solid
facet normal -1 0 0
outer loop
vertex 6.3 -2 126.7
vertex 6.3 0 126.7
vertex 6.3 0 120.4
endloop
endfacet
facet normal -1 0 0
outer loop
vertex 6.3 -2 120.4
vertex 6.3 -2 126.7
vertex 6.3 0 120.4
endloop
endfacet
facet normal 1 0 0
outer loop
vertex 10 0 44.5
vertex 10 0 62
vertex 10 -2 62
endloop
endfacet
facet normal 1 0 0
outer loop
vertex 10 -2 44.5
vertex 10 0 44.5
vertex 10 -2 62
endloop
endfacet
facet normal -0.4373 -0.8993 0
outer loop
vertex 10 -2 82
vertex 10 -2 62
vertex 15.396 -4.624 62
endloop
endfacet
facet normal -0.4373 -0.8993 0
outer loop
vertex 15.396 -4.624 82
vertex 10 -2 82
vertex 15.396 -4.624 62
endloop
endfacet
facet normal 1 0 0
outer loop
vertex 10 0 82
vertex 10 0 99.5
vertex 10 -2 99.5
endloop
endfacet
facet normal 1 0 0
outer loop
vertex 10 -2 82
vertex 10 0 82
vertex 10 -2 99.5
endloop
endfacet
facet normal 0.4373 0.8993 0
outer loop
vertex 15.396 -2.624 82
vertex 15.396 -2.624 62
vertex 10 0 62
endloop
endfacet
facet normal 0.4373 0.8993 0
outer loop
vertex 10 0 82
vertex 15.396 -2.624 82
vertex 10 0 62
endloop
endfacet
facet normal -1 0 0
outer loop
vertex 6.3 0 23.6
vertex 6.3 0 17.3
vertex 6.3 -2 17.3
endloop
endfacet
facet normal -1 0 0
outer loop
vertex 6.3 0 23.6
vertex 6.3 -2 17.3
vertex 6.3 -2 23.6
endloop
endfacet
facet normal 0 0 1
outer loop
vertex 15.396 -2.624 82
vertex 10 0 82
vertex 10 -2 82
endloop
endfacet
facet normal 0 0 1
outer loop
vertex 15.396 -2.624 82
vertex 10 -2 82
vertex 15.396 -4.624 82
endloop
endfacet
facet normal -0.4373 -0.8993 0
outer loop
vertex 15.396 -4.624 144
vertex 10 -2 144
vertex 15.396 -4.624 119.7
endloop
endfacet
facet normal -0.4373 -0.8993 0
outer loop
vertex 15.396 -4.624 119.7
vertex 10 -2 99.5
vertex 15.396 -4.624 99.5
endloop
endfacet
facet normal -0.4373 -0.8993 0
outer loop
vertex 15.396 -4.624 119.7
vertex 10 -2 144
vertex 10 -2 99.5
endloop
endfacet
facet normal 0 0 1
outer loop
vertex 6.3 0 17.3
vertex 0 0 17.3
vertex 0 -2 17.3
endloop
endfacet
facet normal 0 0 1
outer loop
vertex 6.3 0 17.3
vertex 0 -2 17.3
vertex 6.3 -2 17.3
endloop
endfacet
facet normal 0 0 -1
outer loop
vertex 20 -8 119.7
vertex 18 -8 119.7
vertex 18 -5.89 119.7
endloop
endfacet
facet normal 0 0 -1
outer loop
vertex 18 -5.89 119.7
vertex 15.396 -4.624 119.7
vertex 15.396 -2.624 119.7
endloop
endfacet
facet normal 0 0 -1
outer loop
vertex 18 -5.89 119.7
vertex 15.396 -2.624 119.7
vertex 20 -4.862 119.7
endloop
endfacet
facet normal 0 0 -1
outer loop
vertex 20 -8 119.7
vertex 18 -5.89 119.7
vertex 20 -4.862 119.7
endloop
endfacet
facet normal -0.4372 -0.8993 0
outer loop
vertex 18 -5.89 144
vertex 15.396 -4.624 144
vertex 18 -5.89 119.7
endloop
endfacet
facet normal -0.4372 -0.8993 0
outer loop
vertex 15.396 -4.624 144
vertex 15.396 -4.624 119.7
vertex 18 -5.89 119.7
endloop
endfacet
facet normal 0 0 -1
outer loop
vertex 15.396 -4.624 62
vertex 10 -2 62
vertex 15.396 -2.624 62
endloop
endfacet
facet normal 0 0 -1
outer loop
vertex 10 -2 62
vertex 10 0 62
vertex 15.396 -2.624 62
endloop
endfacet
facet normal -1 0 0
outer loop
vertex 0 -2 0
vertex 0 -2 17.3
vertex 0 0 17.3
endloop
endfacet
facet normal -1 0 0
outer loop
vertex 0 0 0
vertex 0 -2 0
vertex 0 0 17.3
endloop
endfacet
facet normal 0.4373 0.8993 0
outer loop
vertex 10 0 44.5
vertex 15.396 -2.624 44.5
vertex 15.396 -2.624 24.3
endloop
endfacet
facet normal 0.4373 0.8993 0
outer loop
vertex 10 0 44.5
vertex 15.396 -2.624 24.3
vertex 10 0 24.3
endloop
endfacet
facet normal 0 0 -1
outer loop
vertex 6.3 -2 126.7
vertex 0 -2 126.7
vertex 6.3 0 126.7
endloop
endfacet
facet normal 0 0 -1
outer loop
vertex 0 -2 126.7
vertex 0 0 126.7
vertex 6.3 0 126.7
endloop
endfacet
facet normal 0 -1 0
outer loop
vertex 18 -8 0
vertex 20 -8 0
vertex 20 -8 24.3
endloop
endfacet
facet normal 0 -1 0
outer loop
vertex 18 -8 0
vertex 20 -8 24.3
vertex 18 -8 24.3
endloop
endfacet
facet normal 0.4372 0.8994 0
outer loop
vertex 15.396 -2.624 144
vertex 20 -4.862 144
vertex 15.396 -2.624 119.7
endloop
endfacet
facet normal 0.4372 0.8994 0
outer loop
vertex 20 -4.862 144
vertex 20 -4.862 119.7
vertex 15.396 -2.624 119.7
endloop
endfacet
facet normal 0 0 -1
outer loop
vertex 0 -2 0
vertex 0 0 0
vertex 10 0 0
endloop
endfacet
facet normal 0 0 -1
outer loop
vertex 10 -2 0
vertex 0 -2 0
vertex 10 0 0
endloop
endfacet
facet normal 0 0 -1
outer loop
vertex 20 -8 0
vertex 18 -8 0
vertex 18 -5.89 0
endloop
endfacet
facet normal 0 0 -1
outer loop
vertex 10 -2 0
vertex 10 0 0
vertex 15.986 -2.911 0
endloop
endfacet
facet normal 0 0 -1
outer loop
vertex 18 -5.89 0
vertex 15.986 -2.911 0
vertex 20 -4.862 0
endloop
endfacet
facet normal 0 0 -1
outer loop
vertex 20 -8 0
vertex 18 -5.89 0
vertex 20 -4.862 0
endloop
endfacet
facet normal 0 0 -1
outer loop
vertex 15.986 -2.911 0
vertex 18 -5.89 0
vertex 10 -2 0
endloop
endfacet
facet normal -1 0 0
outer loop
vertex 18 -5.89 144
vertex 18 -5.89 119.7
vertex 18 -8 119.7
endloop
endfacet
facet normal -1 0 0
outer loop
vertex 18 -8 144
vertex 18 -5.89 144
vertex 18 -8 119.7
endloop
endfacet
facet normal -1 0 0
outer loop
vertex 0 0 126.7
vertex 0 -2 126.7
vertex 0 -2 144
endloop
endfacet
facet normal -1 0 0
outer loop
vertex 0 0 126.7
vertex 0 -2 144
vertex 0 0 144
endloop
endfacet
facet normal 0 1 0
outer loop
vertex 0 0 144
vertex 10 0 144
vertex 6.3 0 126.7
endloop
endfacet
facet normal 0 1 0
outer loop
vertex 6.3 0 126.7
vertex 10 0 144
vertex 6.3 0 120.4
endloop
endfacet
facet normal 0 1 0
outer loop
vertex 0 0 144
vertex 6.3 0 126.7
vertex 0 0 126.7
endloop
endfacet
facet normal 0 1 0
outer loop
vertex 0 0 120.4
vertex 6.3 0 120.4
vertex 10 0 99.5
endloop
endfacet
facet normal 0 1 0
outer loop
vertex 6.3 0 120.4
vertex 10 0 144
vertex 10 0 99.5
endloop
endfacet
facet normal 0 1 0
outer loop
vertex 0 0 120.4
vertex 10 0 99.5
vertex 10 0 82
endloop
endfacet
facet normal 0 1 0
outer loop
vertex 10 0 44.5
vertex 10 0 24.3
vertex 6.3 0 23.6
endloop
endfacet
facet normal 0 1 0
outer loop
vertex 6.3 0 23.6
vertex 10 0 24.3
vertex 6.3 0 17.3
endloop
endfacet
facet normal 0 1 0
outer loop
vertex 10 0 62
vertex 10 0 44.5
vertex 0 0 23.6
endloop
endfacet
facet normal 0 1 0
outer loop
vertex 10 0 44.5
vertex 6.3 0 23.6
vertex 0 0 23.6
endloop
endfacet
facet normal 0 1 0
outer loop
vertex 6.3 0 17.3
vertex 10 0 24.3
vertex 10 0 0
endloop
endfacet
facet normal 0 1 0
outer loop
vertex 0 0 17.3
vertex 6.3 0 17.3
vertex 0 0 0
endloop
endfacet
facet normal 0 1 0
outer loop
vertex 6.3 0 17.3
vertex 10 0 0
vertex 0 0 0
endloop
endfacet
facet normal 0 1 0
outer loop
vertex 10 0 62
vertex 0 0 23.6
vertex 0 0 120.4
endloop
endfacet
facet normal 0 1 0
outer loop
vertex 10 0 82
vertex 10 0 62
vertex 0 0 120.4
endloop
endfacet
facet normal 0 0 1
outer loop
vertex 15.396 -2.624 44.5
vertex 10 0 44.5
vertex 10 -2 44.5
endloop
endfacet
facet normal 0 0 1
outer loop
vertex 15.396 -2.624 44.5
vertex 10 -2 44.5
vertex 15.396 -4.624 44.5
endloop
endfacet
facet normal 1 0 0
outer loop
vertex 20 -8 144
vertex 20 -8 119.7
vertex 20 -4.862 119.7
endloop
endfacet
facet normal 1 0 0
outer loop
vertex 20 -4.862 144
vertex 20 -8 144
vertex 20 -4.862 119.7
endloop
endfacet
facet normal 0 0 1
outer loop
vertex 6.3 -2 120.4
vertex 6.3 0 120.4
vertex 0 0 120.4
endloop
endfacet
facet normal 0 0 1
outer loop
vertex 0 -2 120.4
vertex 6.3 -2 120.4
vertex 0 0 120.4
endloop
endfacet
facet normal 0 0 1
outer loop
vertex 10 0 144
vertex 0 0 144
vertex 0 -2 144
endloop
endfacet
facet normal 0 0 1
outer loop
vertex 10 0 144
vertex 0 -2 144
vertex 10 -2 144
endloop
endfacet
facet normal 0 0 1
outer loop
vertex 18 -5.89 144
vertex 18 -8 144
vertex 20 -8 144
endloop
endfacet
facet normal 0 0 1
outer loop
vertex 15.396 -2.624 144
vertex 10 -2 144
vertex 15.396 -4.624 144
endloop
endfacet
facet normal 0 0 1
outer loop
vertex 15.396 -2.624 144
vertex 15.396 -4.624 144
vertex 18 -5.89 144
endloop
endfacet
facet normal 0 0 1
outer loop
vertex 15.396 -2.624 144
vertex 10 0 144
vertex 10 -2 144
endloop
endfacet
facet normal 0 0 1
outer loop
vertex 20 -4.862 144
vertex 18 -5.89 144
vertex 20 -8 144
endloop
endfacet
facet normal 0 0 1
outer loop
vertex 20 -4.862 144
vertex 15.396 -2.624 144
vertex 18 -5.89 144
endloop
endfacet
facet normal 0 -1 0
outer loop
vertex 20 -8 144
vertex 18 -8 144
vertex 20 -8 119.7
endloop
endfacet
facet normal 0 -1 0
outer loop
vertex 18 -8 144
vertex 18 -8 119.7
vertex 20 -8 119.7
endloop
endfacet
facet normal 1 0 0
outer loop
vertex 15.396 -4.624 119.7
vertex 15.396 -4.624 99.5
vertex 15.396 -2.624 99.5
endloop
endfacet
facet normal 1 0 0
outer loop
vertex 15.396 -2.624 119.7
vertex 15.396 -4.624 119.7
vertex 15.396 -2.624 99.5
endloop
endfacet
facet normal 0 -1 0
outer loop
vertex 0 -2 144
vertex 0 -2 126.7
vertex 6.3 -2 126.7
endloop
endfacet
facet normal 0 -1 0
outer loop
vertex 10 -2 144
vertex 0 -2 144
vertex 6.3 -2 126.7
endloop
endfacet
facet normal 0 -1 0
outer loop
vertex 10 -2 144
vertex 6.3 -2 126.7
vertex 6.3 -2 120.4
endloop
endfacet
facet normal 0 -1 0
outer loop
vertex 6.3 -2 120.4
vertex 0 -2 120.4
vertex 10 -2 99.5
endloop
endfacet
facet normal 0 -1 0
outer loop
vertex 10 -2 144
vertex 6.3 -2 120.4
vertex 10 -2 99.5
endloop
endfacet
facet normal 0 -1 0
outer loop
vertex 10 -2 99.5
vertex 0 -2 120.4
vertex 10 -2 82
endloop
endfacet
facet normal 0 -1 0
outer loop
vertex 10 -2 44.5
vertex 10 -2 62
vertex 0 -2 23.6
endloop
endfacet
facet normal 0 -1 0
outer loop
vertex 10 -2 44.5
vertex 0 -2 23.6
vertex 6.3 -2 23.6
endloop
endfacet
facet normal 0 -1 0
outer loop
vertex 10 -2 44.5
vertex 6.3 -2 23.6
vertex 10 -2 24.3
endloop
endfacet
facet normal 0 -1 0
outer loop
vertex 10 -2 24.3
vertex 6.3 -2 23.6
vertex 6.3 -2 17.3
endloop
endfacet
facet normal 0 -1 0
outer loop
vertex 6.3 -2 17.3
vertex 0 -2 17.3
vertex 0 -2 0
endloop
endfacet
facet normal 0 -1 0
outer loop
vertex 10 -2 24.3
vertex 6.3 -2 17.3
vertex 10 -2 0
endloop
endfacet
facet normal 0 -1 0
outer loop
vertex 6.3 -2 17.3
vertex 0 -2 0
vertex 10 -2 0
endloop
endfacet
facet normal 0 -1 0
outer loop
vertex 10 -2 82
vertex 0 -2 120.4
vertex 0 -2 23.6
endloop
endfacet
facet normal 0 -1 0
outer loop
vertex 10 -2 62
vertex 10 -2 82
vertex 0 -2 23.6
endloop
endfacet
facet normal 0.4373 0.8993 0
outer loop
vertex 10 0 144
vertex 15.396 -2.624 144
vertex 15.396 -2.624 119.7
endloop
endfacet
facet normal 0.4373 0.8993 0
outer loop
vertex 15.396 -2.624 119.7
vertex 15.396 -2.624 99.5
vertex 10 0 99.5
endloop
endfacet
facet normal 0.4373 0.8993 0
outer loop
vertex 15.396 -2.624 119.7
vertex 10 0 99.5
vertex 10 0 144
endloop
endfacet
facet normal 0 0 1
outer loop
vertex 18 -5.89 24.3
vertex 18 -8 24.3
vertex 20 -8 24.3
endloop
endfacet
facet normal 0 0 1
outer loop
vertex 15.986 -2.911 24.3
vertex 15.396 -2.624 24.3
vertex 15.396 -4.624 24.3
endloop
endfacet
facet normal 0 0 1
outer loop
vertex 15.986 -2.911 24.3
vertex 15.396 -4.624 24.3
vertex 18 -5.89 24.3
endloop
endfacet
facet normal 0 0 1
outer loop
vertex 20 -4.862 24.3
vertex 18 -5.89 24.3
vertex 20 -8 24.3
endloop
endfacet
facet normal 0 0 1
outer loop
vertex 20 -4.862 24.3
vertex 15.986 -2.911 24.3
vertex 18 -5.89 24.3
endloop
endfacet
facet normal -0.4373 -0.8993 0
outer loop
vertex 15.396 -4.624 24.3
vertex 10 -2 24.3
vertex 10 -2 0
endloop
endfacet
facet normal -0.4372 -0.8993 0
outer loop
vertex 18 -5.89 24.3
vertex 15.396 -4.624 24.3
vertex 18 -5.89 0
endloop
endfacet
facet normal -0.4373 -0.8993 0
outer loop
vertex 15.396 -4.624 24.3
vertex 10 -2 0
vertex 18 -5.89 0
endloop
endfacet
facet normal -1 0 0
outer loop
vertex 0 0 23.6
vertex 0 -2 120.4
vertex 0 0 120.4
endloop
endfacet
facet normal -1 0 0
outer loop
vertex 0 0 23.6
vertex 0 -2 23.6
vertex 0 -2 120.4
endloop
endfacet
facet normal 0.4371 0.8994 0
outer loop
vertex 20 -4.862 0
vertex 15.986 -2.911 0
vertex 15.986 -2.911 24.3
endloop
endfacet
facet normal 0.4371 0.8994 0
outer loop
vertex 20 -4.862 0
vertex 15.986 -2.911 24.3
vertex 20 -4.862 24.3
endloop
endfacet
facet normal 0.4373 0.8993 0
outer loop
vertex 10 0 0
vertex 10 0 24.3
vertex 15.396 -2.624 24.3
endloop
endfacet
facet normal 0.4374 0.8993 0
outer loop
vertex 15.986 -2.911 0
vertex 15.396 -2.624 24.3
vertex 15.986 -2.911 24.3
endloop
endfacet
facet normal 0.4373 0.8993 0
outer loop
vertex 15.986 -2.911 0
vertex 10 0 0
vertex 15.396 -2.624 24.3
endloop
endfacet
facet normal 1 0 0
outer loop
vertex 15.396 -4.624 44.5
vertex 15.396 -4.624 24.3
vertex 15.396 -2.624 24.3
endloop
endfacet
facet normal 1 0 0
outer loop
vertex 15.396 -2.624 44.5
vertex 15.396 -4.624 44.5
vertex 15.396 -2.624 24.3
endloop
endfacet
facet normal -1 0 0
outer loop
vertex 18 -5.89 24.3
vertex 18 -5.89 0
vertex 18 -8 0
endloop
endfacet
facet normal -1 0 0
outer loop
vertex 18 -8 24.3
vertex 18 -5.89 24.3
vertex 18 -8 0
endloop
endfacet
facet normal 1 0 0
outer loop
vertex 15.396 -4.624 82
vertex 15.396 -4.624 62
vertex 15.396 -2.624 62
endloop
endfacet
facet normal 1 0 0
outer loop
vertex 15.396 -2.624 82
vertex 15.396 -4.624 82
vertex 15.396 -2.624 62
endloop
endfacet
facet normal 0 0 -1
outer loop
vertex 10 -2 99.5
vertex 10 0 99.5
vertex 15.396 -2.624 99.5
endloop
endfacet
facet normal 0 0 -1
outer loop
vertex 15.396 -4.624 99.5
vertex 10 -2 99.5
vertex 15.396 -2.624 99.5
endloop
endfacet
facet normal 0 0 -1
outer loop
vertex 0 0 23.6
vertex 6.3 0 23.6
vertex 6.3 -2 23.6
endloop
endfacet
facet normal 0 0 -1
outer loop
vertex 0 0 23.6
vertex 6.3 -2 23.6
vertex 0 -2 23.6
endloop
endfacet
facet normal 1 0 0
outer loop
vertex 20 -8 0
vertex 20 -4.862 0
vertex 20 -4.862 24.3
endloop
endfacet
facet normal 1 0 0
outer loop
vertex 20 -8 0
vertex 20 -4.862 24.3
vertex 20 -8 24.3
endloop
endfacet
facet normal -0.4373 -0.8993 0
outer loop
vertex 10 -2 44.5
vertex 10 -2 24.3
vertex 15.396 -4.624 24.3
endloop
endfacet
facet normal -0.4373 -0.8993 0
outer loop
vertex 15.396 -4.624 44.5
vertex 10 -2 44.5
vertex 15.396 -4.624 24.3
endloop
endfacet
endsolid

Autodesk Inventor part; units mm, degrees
ref_plane "YZ Plane" through (0, 0, 0) normal (1, 0, 0) x (0, 1, 0)
ref_plane "XZ Plane" through (0, 0, 0) normal (0, 1, 0) x (-1, 0, 0)
ref_plane "XY Plane" through (0, 0, 0) normal (0, 0, 1) x (1, 0, 0)
sketch "Szkic32" plane through (0, 0, 0) normal (0, 0, 1) x (1, 0, 0)
  line L0 (0, 0) -> (10, 0)
  line L1 (10, 0) -> (15.9865, -2.9108)
  line L2 (10, 0) -> (16.6566, 0) construction
  line L3 (10, 0) -> (20.0005, -4.8625)
  line L4 (20.0005, -4.8625) -> (20.0005, -7.9995)
  line L5 (20.0005, -7.9995) -> (18.0005, -7.9995)
  line L6 (0, 0) -> (0, -2)
  line L7 (0, -2) -> (10, -2)
  line L8 (10, -2) -> (18.0005, -5.89)
  line L9 (10, -2) -> (18.8961, -2) construction
  line L10 (18.0005, -5.89) -> (18.0005, -7.9995)
  dimension "d102" = 10
  dimension "d103" = 25.93
  dimension "d104" = 11.12
  dimension "d105" = 3.137
  dimension "d106" = 2
  dimension "d107" = 2
  dimension "d108" = 10
  dimension "d109" = 25.93
extrude "Wyciągnięcie proste35" add sketch "Szkic32" along normal blind 24.3
sketch "Szkic33" plane through (0, 0, 24.3) normal (0, 0, 1) x (1, 0, 0)
  line L0 (10, 0) -> (0, 0) projected
  line L1 (0, 0) -> (0, -2) projected
  line L2 (0, -2) -> (10, -2) projected
  line L3 (0, 0) -> (10, 0)
  line L4 (10, 0) -> (10, -2)
  line L5 (10, -2) -> (0, -2)
  line L6 (0, -2) -> (0, 0)
  line L7 (10, -2) -> (15.396, -4.6236)
  line L8 (10, -2) -> (18.0005, -5.89) projected
  line L9 (15.396, -4.6236) -> (15.396, -2.6236)
  line L10 (20.0005, -4.8625) -> (10, 0) projected
  line L11 (10, 0) -> (15.396, -2.6236)
  dimension "d112" = 6
extrude "Wyciągnięcie proste36" add sketch "Szkic33" along normal blind 20.2
sketch "Szkic34" plane through (0, 0, 44.5) normal (0, 0, 1) x (1, 0, 0)
  line L0 (10, 0) -> (0, 0) projected
  line L1 (0, -2) -> (10, -2) projected
  line L2 (0, 0) -> (10, 0)
  line L3 (10, 0) -> (10, -2)
  line L4 (10, -2) -> (0, -2)
  line L5 (0, -2) -> (0, 0)
extrude "Wyciągnięcie proste37" add sketch "Szkic34" along normal blind 17.5
sketch "Szkic36" plane through (0, 0, 62) normal (0, 0, 1) x (1, 0, 0)
  line L0 (15.396, -2.6236) -> (10, 0) projected
  line L1 (15.396, -4.6236) -> (15.396, -2.6236) projected
  line L2 (10, -2) -> (15.396, -4.6236) projected
  line L3 (0, -2) -> (10, -2) projected
  line L4 (10, 0) -> (0, 0) projected
  line L5 (0, 0) -> (0, -2) projected
  line L6 (10, 0) -> (15.396, -2.6236)
  line L7 (15.396, -2.6236) -> (15.396, -4.6236)
extrude "Wyciągnięcie proste38" add sketch "Szkic36" along normal blind 20
sketch "Szkic37" plane through (0, 0, 82) normal (0, 0, 1) x (1, 0, 0)
  line L0 (10, 0) -> (0, 0) projected
  line L1 (0, -2) -> (10, -2) projected
  line L2 (0, 0) -> (10, 0)
  line L3 (10, 0) -> (10, -2)
  line L4 (10, -2) -> (0, -2)
  line L5 (0, -2) -> (0, 0)
extrude "Wyciągnięcie proste39" add sketch "Szkic37" along normal blind 17.5
sketch "Szkic38" plane through (0, 0, 99.5) normal (0, 0, 1) x (1, 0, 0)
  line L0 (15.396, -2.6236) -> (10, 0) projected
  line L1 (15.396, -4.6236) -> (15.396, -2.6236) projected
  line L2 (10, -2) -> (15.396, -4.6236) projected
  line L3 (0, -2) -> (10, -2) projected
  line L4 (10, 0) -> (0, 0) projected
  line L5 (10, 0) -> (0, 0) projected
  line L6 (0, 0) -> (0, -2) projected
  line L7 (0, -2) -> (10, -2) projected
  line L8 (10, -2) -> (10, 0) projected
extrude "Wyciągnięcie proste40" add sketch "Szkic38" along normal blind 20.2
sketch "Szkic39" plane through (0, 0, 119.7) normal (0, 0, 1) x (1, 0, 0)
  line L0 (15.396, -2.6236) -> (15.396, -4.6236) projected
  line L1 (15.396, -4.6236) -> (18.0005, -5.89) projected
  line L2 (18.0005, -5.89) -> (18.0005, -7.9995) projected
  line L3 (18.0005, -7.9995) -> (20.0005, -7.9995) projected
  line L4 (20.0005, -7.9995) -> (20.0005, -4.8625) projected
  line L5 (20.0005, -4.8625) -> (15.396, -2.6236) projected
  line L6 (0, 0) -> (0, -2) projected
  line L7 (0, -2) -> (10, -2) projected
  line L8 (10, -2) -> (15.396, -4.6236) projected
  line L9 (15.396, -4.6236) -> (15.396, -2.6236) projected
  line L10 (15.396, -2.6236) -> (10, 0) projected
  line L11 (10, 0) -> (0, 0) projected
extrude "Wyciągnięcie proste41" add sketch "Szkic39" along normal blind 24.3
sketch "Szkic40" plane through (0, 0, 0) normal (0, 1, 0) x (1, 0, 0)
  line L0 (0, 0) -> (0, -144) projected
  line L1 (0, -17.3) -> (6.3, -17.3)
  line L2 (6.3, -17.3) -> (6.3, -23.6)
  line L3 (6.3, -23.6) -> (0, -23.6)
  line L4 (0, -23.6) -> (0, -17.3)
  line L5 (10, 0) -> (0, 0) projected
  line L6 (0, -126.7) -> (6.3, -126.7)
  line L7 (6.3, -126.7) -> (6.3, -120.4)
  line L8 (6.3, -120.4) -> (0, -120.4)
  line L9 (0, -120.4) -> (0, -126.7)
  line L10 (10, -144) -> (0, -144) projected
  point P0 (0, -120.4)
  point P1 (0, -23.6)
  dimension "d125" = 6.3
  dimension "d126" = 6.3
  dimension "d127" = 17.3
  dimension "d128" = 6.3
  dimension "d129" = 6.3
  dimension "d130" = 17.3
extrude "Wyciągnięcie proste42" cut sketch "Szkic40" against normal blind 2
properties part number "prrzod"
